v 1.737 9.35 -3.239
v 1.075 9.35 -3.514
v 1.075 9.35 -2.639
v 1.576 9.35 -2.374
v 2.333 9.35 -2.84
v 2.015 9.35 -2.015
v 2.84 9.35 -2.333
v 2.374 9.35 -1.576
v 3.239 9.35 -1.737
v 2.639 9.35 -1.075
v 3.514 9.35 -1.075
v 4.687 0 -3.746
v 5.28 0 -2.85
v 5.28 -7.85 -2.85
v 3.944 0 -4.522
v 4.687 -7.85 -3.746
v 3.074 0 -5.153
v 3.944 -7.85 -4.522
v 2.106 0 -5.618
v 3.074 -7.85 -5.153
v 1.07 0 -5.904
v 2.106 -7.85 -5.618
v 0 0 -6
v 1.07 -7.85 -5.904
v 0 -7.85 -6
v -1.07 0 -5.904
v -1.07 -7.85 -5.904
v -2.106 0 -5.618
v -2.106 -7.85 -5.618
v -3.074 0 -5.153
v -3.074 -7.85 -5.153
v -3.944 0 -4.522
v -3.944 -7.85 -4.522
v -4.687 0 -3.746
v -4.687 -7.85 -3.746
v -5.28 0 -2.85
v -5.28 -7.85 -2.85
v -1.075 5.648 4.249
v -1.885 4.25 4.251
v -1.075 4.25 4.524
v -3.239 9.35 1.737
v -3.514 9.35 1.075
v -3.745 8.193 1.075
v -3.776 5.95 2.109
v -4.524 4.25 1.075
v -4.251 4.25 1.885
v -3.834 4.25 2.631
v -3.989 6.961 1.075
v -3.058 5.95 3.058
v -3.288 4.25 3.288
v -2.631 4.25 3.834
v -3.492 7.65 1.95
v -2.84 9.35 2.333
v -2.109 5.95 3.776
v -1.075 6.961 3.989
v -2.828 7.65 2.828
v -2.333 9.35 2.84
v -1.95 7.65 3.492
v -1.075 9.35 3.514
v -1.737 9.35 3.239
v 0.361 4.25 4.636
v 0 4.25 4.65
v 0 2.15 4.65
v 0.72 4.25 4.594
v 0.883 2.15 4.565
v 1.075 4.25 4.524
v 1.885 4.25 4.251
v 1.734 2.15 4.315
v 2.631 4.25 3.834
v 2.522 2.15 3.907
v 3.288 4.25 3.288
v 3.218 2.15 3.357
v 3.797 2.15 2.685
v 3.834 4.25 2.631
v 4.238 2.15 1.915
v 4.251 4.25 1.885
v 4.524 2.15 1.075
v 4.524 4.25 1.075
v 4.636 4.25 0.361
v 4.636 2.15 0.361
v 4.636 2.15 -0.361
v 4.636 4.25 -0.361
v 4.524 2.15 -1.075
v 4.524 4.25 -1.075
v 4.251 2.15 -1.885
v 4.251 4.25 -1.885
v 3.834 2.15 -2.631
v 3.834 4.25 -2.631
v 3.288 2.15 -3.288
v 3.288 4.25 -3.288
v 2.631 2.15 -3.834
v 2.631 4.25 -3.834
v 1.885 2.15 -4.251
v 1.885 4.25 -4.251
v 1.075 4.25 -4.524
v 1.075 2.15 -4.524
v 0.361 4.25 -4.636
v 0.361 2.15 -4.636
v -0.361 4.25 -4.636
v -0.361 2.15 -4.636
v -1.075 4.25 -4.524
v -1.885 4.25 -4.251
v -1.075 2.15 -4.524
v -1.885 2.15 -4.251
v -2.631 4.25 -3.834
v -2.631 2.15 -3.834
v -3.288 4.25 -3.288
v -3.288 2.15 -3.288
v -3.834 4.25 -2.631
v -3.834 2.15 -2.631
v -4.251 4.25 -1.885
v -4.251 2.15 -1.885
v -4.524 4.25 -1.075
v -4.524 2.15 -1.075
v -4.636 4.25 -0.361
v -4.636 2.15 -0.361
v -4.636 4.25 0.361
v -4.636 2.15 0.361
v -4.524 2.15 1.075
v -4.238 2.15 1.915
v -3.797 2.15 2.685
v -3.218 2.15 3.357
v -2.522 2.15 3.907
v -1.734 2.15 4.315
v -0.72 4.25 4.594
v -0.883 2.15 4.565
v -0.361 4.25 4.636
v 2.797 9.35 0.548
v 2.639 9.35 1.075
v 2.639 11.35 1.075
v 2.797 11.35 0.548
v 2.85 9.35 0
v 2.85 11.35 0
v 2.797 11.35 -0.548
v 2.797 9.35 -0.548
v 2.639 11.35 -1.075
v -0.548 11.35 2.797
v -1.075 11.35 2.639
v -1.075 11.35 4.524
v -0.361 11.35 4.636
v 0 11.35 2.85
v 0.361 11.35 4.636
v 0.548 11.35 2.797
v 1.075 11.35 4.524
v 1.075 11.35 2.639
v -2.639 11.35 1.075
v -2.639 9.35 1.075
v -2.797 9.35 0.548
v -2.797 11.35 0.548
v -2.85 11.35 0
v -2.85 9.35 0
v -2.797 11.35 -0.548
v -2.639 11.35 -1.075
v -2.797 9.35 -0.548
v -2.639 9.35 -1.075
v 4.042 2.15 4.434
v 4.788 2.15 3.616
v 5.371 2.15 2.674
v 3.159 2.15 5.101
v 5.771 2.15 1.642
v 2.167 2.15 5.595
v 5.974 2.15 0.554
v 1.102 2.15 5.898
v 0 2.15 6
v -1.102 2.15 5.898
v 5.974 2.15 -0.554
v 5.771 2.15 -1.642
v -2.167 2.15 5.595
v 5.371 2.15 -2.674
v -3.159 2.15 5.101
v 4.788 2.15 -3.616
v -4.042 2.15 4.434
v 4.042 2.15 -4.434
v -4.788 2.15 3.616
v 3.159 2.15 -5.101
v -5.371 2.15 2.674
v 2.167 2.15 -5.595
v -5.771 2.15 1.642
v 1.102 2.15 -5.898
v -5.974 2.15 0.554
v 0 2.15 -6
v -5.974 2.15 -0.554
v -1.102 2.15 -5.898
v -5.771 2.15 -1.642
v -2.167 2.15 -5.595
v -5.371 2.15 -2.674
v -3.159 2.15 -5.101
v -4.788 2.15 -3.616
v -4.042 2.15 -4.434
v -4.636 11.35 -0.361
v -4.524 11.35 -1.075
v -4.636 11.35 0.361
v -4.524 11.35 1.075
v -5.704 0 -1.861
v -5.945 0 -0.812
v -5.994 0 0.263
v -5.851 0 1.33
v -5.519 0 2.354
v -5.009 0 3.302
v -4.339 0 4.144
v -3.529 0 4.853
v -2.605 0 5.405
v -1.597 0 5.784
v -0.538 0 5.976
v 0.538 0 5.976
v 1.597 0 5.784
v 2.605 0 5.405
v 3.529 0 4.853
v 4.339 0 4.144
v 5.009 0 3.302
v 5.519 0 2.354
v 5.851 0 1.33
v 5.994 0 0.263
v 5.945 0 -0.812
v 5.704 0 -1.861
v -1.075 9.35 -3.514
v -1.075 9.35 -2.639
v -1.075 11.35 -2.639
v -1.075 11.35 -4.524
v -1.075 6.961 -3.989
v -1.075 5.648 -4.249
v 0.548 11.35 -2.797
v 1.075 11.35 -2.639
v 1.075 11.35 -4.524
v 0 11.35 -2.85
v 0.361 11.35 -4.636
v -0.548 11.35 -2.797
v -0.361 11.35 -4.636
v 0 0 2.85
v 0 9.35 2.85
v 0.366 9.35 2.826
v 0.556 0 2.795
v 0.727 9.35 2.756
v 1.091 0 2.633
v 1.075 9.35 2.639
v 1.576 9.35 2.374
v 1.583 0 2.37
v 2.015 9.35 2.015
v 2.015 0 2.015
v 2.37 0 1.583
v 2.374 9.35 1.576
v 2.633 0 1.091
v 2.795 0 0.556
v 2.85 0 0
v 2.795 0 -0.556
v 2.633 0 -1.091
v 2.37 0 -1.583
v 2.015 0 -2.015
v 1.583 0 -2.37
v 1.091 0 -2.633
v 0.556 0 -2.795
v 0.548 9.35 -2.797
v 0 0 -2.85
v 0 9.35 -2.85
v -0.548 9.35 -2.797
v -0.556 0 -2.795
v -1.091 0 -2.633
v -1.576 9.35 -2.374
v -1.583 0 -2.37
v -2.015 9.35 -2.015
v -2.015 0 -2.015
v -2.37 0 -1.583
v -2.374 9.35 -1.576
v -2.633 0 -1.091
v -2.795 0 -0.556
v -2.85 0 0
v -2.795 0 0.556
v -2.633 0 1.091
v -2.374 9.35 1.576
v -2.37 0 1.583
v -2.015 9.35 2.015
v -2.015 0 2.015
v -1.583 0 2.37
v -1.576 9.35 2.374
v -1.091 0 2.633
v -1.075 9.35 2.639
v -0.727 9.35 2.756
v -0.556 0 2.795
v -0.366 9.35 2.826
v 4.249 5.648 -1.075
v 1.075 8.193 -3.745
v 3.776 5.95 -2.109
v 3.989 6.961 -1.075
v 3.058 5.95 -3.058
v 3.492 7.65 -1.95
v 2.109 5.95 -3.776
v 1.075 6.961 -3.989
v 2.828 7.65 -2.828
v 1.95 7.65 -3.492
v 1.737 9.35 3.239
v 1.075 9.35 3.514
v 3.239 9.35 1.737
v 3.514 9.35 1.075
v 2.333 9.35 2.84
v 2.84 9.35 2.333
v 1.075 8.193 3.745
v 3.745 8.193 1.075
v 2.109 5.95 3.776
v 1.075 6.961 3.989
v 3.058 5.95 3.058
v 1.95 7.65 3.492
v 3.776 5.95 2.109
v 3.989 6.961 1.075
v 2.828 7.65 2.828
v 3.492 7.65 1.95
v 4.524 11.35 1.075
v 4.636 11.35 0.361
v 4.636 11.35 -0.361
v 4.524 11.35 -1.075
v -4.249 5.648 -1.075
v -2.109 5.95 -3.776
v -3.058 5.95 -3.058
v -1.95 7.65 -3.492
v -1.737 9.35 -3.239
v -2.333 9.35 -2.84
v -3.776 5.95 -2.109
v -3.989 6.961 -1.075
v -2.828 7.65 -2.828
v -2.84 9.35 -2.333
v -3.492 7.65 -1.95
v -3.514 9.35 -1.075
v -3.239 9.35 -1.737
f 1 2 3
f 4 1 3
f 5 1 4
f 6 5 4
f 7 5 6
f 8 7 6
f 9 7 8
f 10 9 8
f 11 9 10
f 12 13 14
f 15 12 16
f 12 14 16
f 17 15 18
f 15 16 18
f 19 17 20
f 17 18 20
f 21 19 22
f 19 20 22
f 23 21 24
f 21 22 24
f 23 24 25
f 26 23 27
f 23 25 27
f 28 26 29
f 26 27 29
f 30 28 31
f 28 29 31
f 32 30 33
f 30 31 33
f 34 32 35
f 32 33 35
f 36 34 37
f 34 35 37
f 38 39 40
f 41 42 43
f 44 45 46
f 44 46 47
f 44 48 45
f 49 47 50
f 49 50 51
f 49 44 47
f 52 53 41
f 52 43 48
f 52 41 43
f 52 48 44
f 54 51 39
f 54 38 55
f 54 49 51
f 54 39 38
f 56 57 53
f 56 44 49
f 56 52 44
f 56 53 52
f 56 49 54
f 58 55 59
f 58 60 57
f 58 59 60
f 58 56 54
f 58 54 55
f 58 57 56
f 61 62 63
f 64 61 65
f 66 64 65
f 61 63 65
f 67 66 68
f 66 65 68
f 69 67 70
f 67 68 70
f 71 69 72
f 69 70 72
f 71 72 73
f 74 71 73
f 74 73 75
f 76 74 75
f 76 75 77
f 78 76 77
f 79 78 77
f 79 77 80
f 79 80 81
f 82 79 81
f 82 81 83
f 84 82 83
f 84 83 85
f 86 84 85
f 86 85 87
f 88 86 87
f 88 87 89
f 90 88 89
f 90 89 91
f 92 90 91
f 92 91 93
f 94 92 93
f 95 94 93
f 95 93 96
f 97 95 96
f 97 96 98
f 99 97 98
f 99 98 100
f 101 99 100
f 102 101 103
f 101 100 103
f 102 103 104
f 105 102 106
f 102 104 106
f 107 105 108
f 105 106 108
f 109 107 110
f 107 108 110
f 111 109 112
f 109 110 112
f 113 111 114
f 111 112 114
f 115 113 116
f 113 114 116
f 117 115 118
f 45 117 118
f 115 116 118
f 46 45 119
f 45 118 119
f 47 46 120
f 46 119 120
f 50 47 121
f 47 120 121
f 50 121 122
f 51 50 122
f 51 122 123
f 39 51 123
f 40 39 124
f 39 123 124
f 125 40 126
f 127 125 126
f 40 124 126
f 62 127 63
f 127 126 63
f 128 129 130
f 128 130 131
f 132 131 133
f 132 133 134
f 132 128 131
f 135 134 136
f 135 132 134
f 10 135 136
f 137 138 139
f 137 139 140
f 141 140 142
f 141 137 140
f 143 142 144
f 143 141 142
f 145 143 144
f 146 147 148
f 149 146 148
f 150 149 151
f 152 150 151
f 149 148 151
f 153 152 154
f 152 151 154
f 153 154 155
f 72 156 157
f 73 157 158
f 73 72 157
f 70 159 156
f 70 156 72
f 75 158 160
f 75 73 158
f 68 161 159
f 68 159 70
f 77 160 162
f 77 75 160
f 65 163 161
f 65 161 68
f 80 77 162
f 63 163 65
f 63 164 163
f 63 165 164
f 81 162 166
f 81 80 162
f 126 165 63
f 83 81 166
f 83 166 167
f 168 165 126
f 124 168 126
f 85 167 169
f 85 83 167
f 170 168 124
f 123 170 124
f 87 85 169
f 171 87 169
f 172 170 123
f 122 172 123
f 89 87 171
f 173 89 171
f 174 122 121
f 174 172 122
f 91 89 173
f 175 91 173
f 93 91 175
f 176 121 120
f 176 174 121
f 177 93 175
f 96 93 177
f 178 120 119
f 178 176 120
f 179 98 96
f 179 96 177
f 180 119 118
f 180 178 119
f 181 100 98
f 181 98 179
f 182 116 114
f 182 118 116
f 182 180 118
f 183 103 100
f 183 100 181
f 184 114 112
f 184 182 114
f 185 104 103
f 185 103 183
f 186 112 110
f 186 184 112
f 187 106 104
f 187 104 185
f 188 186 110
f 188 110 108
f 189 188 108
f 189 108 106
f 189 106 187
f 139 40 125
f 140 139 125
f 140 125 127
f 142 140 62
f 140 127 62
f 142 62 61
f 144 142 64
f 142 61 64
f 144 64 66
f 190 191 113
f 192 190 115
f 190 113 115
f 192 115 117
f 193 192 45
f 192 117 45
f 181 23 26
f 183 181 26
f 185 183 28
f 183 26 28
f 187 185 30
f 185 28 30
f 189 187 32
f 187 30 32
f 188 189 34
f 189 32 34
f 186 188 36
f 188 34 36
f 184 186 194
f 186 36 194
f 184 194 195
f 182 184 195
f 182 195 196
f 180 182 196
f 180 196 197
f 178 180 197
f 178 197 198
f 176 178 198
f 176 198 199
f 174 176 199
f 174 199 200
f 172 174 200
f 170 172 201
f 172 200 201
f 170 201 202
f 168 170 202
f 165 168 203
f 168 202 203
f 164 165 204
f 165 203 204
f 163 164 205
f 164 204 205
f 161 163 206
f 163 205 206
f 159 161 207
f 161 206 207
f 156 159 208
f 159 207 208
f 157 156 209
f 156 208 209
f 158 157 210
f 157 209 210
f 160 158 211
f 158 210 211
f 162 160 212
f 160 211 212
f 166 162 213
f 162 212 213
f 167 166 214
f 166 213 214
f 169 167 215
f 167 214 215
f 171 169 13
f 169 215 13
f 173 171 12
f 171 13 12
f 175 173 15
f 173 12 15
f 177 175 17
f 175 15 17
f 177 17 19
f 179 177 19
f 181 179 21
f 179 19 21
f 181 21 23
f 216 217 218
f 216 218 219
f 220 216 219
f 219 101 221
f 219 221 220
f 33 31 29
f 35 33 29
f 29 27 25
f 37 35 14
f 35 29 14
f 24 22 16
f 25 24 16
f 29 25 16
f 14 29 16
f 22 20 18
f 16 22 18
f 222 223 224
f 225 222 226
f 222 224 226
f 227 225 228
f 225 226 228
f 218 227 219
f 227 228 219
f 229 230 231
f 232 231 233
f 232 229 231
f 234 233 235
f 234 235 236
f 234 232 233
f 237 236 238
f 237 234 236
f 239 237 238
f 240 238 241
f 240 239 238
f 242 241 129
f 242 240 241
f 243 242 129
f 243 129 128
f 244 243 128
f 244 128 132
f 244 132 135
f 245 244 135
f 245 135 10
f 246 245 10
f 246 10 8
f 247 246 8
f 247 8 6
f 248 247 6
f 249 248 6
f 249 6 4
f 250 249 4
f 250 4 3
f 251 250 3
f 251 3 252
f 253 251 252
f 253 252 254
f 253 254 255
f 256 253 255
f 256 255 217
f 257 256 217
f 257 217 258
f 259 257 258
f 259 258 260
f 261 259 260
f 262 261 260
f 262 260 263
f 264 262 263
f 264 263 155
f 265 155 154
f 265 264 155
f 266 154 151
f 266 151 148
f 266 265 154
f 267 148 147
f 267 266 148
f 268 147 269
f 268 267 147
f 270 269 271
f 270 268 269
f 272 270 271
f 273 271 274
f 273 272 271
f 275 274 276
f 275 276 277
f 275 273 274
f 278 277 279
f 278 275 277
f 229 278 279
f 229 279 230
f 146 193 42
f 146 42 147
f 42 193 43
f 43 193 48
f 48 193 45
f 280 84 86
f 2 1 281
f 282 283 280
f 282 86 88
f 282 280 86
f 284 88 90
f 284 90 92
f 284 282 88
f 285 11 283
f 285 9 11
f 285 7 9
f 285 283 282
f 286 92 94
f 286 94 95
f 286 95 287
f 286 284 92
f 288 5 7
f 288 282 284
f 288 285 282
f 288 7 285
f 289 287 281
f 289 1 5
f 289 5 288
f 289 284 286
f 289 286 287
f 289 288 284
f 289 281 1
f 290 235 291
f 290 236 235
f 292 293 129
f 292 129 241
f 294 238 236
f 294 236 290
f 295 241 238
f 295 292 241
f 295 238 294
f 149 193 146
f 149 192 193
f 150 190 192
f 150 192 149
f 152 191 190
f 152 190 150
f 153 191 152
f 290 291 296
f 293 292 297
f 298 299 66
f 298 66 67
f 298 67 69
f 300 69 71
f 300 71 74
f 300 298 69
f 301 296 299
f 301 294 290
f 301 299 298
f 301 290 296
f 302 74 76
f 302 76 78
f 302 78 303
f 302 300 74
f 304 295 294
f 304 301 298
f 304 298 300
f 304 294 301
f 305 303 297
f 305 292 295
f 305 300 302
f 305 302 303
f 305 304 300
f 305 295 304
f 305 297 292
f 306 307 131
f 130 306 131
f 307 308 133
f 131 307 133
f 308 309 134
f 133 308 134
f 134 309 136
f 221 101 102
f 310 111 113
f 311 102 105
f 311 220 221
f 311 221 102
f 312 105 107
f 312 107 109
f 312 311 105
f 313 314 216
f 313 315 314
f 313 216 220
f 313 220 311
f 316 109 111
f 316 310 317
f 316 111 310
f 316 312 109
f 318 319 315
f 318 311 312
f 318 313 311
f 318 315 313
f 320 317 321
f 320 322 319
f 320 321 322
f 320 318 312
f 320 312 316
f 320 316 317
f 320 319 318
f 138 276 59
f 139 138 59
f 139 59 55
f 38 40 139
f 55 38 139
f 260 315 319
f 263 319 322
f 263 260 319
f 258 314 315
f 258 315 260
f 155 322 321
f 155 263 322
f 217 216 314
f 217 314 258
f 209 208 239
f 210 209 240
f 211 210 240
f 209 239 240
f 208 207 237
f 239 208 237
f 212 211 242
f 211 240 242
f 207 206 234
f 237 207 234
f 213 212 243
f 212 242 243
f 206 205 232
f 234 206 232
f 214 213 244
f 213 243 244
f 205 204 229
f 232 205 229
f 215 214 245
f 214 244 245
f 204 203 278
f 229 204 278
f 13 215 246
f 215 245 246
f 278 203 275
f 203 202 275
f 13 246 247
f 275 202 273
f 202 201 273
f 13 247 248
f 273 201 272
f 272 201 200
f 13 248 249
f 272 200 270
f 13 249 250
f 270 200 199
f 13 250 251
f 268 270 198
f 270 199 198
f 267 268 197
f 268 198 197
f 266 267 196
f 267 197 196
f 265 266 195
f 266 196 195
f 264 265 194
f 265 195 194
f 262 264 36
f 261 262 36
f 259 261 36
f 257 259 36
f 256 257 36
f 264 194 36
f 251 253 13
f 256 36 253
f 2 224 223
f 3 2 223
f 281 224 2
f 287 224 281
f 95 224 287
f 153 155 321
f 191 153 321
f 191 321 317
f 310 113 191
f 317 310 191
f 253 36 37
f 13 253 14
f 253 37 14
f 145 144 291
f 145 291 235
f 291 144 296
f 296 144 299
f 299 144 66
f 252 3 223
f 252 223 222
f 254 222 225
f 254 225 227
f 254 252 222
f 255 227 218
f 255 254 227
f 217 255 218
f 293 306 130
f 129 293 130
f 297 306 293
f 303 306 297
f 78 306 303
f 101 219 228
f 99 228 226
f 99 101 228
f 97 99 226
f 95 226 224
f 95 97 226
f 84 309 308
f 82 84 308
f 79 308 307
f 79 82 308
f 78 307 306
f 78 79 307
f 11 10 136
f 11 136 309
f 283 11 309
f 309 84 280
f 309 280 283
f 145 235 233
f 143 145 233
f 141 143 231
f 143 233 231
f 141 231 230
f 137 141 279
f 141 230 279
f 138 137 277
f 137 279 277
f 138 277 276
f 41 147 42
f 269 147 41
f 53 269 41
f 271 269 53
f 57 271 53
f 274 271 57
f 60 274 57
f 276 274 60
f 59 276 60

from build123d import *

# Parameters (mm, degrees)
CROQUIS1_R                 = 6
SALIENTE_EXTRUIR1_DEPTH    = 2.15
CROQUIS4_R                 = 4.65
SALIENTE_EXTRUIR3_DEPTH    = 7.2
CORTAR_EXTRUIR1_DEPTH      = 7.2
CORTAR_EXTRUIR1_DEPTH_BACK = 12.128342
CROQUIS2_R                 = 2.85
SALIENTE_EXTRUIR2_START    = -10
SALIENTE_EXTRUIR2_DEPTH    = 10
CHAFL_N1_SIZE              = 5.1
CHAFL_N1_SIZE2             = 0.975
SALIENTE_EXTRUIR4_DEPTH    = 9.2


with BuildPart() as part:
    # Croquis1 → Saliente-Extruir1 (new body)
    with BuildSketch(Plane(origin=(0, 0, 0), x_dir=(1, 0, 0), z_dir=(0, 1, 0))):
        Circle(CROQUIS1_R)
    extrude(amount=SALIENTE_EXTRUIR1_DEPTH)

    # Croquis4 → Saliente-Extruir3 (add)
    with BuildSketch(Plane(origin=(0, 2.15, 0), x_dir=(1, 0, 0), z_dir=(0, 1, 0))):
        Circle(CROQUIS4_R)
    extrude(amount=SALIENTE_EXTRUIR3_DEPTH)

    # Croquis2 → Cortar-Extruir1 (cut, two sides: drawn at the far end of the back side and taken through both)
    with BuildSketch(Plane(origin=(0, 2.15, 0), x_dir=(1, 0, 0), z_dir=(0, 1, 0)).offset(-CORTAR_EXTRUIR1_DEPTH_BACK)):
        Circle(CROQUIS2_R)
    extrude(amount=CORTAR_EXTRUIR1_DEPTH + CORTAR_EXTRUIR1_DEPTH_BACK, mode=Mode.SUBTRACT)

    # Croquis3 → Saliente-Extruir2 (add)
    with BuildSketch(Plane(origin=(0, 2.15, 0), x_dir=(1, 0, 0), z_dir=(0, 1, 0)).offset(SALIENTE_EXTRUIR2_START)):
        with BuildLine():
            Line((-5.279915, 2.85), (5.279915, 2.85))
            ThreePointArc((5.279915, 2.85), (0, 6), (-5.279915, 2.85))
        make_face()
    extrude(amount=SALIENTE_EXTRUIR2_DEPTH)

    # Chaflán1
    chafl_n1_edges = [part.edges().sort_by_distance(p)[0] for p in [
        (-4.65, 9.35, 0),
    ]]
    chafl_n1_side = [part.faces().sort_by_distance(p)[0] for p in [
        (-4.65, 5.75, 0),
    ]]
    chamfer(chafl_n1_edges, length=CHAFL_N1_SIZE, length2=CHAFL_N1_SIZE2, reference=chafl_n1_side[0])

    # Croquis6 → Saliente-Extruir4 (add)
    with BuildSketch(Plane(origin=(0, 2.15, 0), x_dir=(1, 0, 0), z_dir=(0, 1, 0))):
        with BuildLine():
            Line((-4.524033, -1.075), (-2.639484, -1.075))
            ThreePointArc((-2.639484, -1.075), (-2.85, 0), (-2.639484, 1.075))
            Line((-2.639484, 1.075), (-4.524033, 1.075))
            ThreePointArc((-4.524033, 1.075), (-4.65, 0), (-4.524033, -1.075))
        make_face()
        with BuildLine():
            Line((1.075, -4.524033), (1.075, -2.639484))
            ThreePointArc((1.075, -2.639484), (0, -2.85), (-1.075, -2.639484))
            Line((-1.075, -2.639484), (-1.075, -4.524033))
            ThreePointArc((-1.075, -4.524033), (0, -4.65), (1.075, -4.524033))
        make_face()
        with BuildLine():
            Line((2.639484, 1.075), (4.524033, 1.075))
            ThreePointArc((4.524033, 1.075), (4.65, 0), (4.524033, -1.075))
            Line((4.524033, -1.075), (2.639484, -1.075))
            ThreePointArc((2.639484, -1.075), (2.85, 0), (2.639484, 1.075))
        make_face()
        with BuildLine():
            Line((-1.075, 2.639484), (-1.075, 4.524033))
            ThreePointArc((-1.075, 4.524033), (0, 4.65), (1.075, 4.524033))
            Line((1.075, 4.524033), (1.075, 2.639484))
            ThreePointArc((1.075, 2.639484), (0, 2.85), (-1.075, 2.639484))
        make_face()
    extrude(amount=SALIENTE_EXTRUIR4_DEPTH)


solid = part.part
